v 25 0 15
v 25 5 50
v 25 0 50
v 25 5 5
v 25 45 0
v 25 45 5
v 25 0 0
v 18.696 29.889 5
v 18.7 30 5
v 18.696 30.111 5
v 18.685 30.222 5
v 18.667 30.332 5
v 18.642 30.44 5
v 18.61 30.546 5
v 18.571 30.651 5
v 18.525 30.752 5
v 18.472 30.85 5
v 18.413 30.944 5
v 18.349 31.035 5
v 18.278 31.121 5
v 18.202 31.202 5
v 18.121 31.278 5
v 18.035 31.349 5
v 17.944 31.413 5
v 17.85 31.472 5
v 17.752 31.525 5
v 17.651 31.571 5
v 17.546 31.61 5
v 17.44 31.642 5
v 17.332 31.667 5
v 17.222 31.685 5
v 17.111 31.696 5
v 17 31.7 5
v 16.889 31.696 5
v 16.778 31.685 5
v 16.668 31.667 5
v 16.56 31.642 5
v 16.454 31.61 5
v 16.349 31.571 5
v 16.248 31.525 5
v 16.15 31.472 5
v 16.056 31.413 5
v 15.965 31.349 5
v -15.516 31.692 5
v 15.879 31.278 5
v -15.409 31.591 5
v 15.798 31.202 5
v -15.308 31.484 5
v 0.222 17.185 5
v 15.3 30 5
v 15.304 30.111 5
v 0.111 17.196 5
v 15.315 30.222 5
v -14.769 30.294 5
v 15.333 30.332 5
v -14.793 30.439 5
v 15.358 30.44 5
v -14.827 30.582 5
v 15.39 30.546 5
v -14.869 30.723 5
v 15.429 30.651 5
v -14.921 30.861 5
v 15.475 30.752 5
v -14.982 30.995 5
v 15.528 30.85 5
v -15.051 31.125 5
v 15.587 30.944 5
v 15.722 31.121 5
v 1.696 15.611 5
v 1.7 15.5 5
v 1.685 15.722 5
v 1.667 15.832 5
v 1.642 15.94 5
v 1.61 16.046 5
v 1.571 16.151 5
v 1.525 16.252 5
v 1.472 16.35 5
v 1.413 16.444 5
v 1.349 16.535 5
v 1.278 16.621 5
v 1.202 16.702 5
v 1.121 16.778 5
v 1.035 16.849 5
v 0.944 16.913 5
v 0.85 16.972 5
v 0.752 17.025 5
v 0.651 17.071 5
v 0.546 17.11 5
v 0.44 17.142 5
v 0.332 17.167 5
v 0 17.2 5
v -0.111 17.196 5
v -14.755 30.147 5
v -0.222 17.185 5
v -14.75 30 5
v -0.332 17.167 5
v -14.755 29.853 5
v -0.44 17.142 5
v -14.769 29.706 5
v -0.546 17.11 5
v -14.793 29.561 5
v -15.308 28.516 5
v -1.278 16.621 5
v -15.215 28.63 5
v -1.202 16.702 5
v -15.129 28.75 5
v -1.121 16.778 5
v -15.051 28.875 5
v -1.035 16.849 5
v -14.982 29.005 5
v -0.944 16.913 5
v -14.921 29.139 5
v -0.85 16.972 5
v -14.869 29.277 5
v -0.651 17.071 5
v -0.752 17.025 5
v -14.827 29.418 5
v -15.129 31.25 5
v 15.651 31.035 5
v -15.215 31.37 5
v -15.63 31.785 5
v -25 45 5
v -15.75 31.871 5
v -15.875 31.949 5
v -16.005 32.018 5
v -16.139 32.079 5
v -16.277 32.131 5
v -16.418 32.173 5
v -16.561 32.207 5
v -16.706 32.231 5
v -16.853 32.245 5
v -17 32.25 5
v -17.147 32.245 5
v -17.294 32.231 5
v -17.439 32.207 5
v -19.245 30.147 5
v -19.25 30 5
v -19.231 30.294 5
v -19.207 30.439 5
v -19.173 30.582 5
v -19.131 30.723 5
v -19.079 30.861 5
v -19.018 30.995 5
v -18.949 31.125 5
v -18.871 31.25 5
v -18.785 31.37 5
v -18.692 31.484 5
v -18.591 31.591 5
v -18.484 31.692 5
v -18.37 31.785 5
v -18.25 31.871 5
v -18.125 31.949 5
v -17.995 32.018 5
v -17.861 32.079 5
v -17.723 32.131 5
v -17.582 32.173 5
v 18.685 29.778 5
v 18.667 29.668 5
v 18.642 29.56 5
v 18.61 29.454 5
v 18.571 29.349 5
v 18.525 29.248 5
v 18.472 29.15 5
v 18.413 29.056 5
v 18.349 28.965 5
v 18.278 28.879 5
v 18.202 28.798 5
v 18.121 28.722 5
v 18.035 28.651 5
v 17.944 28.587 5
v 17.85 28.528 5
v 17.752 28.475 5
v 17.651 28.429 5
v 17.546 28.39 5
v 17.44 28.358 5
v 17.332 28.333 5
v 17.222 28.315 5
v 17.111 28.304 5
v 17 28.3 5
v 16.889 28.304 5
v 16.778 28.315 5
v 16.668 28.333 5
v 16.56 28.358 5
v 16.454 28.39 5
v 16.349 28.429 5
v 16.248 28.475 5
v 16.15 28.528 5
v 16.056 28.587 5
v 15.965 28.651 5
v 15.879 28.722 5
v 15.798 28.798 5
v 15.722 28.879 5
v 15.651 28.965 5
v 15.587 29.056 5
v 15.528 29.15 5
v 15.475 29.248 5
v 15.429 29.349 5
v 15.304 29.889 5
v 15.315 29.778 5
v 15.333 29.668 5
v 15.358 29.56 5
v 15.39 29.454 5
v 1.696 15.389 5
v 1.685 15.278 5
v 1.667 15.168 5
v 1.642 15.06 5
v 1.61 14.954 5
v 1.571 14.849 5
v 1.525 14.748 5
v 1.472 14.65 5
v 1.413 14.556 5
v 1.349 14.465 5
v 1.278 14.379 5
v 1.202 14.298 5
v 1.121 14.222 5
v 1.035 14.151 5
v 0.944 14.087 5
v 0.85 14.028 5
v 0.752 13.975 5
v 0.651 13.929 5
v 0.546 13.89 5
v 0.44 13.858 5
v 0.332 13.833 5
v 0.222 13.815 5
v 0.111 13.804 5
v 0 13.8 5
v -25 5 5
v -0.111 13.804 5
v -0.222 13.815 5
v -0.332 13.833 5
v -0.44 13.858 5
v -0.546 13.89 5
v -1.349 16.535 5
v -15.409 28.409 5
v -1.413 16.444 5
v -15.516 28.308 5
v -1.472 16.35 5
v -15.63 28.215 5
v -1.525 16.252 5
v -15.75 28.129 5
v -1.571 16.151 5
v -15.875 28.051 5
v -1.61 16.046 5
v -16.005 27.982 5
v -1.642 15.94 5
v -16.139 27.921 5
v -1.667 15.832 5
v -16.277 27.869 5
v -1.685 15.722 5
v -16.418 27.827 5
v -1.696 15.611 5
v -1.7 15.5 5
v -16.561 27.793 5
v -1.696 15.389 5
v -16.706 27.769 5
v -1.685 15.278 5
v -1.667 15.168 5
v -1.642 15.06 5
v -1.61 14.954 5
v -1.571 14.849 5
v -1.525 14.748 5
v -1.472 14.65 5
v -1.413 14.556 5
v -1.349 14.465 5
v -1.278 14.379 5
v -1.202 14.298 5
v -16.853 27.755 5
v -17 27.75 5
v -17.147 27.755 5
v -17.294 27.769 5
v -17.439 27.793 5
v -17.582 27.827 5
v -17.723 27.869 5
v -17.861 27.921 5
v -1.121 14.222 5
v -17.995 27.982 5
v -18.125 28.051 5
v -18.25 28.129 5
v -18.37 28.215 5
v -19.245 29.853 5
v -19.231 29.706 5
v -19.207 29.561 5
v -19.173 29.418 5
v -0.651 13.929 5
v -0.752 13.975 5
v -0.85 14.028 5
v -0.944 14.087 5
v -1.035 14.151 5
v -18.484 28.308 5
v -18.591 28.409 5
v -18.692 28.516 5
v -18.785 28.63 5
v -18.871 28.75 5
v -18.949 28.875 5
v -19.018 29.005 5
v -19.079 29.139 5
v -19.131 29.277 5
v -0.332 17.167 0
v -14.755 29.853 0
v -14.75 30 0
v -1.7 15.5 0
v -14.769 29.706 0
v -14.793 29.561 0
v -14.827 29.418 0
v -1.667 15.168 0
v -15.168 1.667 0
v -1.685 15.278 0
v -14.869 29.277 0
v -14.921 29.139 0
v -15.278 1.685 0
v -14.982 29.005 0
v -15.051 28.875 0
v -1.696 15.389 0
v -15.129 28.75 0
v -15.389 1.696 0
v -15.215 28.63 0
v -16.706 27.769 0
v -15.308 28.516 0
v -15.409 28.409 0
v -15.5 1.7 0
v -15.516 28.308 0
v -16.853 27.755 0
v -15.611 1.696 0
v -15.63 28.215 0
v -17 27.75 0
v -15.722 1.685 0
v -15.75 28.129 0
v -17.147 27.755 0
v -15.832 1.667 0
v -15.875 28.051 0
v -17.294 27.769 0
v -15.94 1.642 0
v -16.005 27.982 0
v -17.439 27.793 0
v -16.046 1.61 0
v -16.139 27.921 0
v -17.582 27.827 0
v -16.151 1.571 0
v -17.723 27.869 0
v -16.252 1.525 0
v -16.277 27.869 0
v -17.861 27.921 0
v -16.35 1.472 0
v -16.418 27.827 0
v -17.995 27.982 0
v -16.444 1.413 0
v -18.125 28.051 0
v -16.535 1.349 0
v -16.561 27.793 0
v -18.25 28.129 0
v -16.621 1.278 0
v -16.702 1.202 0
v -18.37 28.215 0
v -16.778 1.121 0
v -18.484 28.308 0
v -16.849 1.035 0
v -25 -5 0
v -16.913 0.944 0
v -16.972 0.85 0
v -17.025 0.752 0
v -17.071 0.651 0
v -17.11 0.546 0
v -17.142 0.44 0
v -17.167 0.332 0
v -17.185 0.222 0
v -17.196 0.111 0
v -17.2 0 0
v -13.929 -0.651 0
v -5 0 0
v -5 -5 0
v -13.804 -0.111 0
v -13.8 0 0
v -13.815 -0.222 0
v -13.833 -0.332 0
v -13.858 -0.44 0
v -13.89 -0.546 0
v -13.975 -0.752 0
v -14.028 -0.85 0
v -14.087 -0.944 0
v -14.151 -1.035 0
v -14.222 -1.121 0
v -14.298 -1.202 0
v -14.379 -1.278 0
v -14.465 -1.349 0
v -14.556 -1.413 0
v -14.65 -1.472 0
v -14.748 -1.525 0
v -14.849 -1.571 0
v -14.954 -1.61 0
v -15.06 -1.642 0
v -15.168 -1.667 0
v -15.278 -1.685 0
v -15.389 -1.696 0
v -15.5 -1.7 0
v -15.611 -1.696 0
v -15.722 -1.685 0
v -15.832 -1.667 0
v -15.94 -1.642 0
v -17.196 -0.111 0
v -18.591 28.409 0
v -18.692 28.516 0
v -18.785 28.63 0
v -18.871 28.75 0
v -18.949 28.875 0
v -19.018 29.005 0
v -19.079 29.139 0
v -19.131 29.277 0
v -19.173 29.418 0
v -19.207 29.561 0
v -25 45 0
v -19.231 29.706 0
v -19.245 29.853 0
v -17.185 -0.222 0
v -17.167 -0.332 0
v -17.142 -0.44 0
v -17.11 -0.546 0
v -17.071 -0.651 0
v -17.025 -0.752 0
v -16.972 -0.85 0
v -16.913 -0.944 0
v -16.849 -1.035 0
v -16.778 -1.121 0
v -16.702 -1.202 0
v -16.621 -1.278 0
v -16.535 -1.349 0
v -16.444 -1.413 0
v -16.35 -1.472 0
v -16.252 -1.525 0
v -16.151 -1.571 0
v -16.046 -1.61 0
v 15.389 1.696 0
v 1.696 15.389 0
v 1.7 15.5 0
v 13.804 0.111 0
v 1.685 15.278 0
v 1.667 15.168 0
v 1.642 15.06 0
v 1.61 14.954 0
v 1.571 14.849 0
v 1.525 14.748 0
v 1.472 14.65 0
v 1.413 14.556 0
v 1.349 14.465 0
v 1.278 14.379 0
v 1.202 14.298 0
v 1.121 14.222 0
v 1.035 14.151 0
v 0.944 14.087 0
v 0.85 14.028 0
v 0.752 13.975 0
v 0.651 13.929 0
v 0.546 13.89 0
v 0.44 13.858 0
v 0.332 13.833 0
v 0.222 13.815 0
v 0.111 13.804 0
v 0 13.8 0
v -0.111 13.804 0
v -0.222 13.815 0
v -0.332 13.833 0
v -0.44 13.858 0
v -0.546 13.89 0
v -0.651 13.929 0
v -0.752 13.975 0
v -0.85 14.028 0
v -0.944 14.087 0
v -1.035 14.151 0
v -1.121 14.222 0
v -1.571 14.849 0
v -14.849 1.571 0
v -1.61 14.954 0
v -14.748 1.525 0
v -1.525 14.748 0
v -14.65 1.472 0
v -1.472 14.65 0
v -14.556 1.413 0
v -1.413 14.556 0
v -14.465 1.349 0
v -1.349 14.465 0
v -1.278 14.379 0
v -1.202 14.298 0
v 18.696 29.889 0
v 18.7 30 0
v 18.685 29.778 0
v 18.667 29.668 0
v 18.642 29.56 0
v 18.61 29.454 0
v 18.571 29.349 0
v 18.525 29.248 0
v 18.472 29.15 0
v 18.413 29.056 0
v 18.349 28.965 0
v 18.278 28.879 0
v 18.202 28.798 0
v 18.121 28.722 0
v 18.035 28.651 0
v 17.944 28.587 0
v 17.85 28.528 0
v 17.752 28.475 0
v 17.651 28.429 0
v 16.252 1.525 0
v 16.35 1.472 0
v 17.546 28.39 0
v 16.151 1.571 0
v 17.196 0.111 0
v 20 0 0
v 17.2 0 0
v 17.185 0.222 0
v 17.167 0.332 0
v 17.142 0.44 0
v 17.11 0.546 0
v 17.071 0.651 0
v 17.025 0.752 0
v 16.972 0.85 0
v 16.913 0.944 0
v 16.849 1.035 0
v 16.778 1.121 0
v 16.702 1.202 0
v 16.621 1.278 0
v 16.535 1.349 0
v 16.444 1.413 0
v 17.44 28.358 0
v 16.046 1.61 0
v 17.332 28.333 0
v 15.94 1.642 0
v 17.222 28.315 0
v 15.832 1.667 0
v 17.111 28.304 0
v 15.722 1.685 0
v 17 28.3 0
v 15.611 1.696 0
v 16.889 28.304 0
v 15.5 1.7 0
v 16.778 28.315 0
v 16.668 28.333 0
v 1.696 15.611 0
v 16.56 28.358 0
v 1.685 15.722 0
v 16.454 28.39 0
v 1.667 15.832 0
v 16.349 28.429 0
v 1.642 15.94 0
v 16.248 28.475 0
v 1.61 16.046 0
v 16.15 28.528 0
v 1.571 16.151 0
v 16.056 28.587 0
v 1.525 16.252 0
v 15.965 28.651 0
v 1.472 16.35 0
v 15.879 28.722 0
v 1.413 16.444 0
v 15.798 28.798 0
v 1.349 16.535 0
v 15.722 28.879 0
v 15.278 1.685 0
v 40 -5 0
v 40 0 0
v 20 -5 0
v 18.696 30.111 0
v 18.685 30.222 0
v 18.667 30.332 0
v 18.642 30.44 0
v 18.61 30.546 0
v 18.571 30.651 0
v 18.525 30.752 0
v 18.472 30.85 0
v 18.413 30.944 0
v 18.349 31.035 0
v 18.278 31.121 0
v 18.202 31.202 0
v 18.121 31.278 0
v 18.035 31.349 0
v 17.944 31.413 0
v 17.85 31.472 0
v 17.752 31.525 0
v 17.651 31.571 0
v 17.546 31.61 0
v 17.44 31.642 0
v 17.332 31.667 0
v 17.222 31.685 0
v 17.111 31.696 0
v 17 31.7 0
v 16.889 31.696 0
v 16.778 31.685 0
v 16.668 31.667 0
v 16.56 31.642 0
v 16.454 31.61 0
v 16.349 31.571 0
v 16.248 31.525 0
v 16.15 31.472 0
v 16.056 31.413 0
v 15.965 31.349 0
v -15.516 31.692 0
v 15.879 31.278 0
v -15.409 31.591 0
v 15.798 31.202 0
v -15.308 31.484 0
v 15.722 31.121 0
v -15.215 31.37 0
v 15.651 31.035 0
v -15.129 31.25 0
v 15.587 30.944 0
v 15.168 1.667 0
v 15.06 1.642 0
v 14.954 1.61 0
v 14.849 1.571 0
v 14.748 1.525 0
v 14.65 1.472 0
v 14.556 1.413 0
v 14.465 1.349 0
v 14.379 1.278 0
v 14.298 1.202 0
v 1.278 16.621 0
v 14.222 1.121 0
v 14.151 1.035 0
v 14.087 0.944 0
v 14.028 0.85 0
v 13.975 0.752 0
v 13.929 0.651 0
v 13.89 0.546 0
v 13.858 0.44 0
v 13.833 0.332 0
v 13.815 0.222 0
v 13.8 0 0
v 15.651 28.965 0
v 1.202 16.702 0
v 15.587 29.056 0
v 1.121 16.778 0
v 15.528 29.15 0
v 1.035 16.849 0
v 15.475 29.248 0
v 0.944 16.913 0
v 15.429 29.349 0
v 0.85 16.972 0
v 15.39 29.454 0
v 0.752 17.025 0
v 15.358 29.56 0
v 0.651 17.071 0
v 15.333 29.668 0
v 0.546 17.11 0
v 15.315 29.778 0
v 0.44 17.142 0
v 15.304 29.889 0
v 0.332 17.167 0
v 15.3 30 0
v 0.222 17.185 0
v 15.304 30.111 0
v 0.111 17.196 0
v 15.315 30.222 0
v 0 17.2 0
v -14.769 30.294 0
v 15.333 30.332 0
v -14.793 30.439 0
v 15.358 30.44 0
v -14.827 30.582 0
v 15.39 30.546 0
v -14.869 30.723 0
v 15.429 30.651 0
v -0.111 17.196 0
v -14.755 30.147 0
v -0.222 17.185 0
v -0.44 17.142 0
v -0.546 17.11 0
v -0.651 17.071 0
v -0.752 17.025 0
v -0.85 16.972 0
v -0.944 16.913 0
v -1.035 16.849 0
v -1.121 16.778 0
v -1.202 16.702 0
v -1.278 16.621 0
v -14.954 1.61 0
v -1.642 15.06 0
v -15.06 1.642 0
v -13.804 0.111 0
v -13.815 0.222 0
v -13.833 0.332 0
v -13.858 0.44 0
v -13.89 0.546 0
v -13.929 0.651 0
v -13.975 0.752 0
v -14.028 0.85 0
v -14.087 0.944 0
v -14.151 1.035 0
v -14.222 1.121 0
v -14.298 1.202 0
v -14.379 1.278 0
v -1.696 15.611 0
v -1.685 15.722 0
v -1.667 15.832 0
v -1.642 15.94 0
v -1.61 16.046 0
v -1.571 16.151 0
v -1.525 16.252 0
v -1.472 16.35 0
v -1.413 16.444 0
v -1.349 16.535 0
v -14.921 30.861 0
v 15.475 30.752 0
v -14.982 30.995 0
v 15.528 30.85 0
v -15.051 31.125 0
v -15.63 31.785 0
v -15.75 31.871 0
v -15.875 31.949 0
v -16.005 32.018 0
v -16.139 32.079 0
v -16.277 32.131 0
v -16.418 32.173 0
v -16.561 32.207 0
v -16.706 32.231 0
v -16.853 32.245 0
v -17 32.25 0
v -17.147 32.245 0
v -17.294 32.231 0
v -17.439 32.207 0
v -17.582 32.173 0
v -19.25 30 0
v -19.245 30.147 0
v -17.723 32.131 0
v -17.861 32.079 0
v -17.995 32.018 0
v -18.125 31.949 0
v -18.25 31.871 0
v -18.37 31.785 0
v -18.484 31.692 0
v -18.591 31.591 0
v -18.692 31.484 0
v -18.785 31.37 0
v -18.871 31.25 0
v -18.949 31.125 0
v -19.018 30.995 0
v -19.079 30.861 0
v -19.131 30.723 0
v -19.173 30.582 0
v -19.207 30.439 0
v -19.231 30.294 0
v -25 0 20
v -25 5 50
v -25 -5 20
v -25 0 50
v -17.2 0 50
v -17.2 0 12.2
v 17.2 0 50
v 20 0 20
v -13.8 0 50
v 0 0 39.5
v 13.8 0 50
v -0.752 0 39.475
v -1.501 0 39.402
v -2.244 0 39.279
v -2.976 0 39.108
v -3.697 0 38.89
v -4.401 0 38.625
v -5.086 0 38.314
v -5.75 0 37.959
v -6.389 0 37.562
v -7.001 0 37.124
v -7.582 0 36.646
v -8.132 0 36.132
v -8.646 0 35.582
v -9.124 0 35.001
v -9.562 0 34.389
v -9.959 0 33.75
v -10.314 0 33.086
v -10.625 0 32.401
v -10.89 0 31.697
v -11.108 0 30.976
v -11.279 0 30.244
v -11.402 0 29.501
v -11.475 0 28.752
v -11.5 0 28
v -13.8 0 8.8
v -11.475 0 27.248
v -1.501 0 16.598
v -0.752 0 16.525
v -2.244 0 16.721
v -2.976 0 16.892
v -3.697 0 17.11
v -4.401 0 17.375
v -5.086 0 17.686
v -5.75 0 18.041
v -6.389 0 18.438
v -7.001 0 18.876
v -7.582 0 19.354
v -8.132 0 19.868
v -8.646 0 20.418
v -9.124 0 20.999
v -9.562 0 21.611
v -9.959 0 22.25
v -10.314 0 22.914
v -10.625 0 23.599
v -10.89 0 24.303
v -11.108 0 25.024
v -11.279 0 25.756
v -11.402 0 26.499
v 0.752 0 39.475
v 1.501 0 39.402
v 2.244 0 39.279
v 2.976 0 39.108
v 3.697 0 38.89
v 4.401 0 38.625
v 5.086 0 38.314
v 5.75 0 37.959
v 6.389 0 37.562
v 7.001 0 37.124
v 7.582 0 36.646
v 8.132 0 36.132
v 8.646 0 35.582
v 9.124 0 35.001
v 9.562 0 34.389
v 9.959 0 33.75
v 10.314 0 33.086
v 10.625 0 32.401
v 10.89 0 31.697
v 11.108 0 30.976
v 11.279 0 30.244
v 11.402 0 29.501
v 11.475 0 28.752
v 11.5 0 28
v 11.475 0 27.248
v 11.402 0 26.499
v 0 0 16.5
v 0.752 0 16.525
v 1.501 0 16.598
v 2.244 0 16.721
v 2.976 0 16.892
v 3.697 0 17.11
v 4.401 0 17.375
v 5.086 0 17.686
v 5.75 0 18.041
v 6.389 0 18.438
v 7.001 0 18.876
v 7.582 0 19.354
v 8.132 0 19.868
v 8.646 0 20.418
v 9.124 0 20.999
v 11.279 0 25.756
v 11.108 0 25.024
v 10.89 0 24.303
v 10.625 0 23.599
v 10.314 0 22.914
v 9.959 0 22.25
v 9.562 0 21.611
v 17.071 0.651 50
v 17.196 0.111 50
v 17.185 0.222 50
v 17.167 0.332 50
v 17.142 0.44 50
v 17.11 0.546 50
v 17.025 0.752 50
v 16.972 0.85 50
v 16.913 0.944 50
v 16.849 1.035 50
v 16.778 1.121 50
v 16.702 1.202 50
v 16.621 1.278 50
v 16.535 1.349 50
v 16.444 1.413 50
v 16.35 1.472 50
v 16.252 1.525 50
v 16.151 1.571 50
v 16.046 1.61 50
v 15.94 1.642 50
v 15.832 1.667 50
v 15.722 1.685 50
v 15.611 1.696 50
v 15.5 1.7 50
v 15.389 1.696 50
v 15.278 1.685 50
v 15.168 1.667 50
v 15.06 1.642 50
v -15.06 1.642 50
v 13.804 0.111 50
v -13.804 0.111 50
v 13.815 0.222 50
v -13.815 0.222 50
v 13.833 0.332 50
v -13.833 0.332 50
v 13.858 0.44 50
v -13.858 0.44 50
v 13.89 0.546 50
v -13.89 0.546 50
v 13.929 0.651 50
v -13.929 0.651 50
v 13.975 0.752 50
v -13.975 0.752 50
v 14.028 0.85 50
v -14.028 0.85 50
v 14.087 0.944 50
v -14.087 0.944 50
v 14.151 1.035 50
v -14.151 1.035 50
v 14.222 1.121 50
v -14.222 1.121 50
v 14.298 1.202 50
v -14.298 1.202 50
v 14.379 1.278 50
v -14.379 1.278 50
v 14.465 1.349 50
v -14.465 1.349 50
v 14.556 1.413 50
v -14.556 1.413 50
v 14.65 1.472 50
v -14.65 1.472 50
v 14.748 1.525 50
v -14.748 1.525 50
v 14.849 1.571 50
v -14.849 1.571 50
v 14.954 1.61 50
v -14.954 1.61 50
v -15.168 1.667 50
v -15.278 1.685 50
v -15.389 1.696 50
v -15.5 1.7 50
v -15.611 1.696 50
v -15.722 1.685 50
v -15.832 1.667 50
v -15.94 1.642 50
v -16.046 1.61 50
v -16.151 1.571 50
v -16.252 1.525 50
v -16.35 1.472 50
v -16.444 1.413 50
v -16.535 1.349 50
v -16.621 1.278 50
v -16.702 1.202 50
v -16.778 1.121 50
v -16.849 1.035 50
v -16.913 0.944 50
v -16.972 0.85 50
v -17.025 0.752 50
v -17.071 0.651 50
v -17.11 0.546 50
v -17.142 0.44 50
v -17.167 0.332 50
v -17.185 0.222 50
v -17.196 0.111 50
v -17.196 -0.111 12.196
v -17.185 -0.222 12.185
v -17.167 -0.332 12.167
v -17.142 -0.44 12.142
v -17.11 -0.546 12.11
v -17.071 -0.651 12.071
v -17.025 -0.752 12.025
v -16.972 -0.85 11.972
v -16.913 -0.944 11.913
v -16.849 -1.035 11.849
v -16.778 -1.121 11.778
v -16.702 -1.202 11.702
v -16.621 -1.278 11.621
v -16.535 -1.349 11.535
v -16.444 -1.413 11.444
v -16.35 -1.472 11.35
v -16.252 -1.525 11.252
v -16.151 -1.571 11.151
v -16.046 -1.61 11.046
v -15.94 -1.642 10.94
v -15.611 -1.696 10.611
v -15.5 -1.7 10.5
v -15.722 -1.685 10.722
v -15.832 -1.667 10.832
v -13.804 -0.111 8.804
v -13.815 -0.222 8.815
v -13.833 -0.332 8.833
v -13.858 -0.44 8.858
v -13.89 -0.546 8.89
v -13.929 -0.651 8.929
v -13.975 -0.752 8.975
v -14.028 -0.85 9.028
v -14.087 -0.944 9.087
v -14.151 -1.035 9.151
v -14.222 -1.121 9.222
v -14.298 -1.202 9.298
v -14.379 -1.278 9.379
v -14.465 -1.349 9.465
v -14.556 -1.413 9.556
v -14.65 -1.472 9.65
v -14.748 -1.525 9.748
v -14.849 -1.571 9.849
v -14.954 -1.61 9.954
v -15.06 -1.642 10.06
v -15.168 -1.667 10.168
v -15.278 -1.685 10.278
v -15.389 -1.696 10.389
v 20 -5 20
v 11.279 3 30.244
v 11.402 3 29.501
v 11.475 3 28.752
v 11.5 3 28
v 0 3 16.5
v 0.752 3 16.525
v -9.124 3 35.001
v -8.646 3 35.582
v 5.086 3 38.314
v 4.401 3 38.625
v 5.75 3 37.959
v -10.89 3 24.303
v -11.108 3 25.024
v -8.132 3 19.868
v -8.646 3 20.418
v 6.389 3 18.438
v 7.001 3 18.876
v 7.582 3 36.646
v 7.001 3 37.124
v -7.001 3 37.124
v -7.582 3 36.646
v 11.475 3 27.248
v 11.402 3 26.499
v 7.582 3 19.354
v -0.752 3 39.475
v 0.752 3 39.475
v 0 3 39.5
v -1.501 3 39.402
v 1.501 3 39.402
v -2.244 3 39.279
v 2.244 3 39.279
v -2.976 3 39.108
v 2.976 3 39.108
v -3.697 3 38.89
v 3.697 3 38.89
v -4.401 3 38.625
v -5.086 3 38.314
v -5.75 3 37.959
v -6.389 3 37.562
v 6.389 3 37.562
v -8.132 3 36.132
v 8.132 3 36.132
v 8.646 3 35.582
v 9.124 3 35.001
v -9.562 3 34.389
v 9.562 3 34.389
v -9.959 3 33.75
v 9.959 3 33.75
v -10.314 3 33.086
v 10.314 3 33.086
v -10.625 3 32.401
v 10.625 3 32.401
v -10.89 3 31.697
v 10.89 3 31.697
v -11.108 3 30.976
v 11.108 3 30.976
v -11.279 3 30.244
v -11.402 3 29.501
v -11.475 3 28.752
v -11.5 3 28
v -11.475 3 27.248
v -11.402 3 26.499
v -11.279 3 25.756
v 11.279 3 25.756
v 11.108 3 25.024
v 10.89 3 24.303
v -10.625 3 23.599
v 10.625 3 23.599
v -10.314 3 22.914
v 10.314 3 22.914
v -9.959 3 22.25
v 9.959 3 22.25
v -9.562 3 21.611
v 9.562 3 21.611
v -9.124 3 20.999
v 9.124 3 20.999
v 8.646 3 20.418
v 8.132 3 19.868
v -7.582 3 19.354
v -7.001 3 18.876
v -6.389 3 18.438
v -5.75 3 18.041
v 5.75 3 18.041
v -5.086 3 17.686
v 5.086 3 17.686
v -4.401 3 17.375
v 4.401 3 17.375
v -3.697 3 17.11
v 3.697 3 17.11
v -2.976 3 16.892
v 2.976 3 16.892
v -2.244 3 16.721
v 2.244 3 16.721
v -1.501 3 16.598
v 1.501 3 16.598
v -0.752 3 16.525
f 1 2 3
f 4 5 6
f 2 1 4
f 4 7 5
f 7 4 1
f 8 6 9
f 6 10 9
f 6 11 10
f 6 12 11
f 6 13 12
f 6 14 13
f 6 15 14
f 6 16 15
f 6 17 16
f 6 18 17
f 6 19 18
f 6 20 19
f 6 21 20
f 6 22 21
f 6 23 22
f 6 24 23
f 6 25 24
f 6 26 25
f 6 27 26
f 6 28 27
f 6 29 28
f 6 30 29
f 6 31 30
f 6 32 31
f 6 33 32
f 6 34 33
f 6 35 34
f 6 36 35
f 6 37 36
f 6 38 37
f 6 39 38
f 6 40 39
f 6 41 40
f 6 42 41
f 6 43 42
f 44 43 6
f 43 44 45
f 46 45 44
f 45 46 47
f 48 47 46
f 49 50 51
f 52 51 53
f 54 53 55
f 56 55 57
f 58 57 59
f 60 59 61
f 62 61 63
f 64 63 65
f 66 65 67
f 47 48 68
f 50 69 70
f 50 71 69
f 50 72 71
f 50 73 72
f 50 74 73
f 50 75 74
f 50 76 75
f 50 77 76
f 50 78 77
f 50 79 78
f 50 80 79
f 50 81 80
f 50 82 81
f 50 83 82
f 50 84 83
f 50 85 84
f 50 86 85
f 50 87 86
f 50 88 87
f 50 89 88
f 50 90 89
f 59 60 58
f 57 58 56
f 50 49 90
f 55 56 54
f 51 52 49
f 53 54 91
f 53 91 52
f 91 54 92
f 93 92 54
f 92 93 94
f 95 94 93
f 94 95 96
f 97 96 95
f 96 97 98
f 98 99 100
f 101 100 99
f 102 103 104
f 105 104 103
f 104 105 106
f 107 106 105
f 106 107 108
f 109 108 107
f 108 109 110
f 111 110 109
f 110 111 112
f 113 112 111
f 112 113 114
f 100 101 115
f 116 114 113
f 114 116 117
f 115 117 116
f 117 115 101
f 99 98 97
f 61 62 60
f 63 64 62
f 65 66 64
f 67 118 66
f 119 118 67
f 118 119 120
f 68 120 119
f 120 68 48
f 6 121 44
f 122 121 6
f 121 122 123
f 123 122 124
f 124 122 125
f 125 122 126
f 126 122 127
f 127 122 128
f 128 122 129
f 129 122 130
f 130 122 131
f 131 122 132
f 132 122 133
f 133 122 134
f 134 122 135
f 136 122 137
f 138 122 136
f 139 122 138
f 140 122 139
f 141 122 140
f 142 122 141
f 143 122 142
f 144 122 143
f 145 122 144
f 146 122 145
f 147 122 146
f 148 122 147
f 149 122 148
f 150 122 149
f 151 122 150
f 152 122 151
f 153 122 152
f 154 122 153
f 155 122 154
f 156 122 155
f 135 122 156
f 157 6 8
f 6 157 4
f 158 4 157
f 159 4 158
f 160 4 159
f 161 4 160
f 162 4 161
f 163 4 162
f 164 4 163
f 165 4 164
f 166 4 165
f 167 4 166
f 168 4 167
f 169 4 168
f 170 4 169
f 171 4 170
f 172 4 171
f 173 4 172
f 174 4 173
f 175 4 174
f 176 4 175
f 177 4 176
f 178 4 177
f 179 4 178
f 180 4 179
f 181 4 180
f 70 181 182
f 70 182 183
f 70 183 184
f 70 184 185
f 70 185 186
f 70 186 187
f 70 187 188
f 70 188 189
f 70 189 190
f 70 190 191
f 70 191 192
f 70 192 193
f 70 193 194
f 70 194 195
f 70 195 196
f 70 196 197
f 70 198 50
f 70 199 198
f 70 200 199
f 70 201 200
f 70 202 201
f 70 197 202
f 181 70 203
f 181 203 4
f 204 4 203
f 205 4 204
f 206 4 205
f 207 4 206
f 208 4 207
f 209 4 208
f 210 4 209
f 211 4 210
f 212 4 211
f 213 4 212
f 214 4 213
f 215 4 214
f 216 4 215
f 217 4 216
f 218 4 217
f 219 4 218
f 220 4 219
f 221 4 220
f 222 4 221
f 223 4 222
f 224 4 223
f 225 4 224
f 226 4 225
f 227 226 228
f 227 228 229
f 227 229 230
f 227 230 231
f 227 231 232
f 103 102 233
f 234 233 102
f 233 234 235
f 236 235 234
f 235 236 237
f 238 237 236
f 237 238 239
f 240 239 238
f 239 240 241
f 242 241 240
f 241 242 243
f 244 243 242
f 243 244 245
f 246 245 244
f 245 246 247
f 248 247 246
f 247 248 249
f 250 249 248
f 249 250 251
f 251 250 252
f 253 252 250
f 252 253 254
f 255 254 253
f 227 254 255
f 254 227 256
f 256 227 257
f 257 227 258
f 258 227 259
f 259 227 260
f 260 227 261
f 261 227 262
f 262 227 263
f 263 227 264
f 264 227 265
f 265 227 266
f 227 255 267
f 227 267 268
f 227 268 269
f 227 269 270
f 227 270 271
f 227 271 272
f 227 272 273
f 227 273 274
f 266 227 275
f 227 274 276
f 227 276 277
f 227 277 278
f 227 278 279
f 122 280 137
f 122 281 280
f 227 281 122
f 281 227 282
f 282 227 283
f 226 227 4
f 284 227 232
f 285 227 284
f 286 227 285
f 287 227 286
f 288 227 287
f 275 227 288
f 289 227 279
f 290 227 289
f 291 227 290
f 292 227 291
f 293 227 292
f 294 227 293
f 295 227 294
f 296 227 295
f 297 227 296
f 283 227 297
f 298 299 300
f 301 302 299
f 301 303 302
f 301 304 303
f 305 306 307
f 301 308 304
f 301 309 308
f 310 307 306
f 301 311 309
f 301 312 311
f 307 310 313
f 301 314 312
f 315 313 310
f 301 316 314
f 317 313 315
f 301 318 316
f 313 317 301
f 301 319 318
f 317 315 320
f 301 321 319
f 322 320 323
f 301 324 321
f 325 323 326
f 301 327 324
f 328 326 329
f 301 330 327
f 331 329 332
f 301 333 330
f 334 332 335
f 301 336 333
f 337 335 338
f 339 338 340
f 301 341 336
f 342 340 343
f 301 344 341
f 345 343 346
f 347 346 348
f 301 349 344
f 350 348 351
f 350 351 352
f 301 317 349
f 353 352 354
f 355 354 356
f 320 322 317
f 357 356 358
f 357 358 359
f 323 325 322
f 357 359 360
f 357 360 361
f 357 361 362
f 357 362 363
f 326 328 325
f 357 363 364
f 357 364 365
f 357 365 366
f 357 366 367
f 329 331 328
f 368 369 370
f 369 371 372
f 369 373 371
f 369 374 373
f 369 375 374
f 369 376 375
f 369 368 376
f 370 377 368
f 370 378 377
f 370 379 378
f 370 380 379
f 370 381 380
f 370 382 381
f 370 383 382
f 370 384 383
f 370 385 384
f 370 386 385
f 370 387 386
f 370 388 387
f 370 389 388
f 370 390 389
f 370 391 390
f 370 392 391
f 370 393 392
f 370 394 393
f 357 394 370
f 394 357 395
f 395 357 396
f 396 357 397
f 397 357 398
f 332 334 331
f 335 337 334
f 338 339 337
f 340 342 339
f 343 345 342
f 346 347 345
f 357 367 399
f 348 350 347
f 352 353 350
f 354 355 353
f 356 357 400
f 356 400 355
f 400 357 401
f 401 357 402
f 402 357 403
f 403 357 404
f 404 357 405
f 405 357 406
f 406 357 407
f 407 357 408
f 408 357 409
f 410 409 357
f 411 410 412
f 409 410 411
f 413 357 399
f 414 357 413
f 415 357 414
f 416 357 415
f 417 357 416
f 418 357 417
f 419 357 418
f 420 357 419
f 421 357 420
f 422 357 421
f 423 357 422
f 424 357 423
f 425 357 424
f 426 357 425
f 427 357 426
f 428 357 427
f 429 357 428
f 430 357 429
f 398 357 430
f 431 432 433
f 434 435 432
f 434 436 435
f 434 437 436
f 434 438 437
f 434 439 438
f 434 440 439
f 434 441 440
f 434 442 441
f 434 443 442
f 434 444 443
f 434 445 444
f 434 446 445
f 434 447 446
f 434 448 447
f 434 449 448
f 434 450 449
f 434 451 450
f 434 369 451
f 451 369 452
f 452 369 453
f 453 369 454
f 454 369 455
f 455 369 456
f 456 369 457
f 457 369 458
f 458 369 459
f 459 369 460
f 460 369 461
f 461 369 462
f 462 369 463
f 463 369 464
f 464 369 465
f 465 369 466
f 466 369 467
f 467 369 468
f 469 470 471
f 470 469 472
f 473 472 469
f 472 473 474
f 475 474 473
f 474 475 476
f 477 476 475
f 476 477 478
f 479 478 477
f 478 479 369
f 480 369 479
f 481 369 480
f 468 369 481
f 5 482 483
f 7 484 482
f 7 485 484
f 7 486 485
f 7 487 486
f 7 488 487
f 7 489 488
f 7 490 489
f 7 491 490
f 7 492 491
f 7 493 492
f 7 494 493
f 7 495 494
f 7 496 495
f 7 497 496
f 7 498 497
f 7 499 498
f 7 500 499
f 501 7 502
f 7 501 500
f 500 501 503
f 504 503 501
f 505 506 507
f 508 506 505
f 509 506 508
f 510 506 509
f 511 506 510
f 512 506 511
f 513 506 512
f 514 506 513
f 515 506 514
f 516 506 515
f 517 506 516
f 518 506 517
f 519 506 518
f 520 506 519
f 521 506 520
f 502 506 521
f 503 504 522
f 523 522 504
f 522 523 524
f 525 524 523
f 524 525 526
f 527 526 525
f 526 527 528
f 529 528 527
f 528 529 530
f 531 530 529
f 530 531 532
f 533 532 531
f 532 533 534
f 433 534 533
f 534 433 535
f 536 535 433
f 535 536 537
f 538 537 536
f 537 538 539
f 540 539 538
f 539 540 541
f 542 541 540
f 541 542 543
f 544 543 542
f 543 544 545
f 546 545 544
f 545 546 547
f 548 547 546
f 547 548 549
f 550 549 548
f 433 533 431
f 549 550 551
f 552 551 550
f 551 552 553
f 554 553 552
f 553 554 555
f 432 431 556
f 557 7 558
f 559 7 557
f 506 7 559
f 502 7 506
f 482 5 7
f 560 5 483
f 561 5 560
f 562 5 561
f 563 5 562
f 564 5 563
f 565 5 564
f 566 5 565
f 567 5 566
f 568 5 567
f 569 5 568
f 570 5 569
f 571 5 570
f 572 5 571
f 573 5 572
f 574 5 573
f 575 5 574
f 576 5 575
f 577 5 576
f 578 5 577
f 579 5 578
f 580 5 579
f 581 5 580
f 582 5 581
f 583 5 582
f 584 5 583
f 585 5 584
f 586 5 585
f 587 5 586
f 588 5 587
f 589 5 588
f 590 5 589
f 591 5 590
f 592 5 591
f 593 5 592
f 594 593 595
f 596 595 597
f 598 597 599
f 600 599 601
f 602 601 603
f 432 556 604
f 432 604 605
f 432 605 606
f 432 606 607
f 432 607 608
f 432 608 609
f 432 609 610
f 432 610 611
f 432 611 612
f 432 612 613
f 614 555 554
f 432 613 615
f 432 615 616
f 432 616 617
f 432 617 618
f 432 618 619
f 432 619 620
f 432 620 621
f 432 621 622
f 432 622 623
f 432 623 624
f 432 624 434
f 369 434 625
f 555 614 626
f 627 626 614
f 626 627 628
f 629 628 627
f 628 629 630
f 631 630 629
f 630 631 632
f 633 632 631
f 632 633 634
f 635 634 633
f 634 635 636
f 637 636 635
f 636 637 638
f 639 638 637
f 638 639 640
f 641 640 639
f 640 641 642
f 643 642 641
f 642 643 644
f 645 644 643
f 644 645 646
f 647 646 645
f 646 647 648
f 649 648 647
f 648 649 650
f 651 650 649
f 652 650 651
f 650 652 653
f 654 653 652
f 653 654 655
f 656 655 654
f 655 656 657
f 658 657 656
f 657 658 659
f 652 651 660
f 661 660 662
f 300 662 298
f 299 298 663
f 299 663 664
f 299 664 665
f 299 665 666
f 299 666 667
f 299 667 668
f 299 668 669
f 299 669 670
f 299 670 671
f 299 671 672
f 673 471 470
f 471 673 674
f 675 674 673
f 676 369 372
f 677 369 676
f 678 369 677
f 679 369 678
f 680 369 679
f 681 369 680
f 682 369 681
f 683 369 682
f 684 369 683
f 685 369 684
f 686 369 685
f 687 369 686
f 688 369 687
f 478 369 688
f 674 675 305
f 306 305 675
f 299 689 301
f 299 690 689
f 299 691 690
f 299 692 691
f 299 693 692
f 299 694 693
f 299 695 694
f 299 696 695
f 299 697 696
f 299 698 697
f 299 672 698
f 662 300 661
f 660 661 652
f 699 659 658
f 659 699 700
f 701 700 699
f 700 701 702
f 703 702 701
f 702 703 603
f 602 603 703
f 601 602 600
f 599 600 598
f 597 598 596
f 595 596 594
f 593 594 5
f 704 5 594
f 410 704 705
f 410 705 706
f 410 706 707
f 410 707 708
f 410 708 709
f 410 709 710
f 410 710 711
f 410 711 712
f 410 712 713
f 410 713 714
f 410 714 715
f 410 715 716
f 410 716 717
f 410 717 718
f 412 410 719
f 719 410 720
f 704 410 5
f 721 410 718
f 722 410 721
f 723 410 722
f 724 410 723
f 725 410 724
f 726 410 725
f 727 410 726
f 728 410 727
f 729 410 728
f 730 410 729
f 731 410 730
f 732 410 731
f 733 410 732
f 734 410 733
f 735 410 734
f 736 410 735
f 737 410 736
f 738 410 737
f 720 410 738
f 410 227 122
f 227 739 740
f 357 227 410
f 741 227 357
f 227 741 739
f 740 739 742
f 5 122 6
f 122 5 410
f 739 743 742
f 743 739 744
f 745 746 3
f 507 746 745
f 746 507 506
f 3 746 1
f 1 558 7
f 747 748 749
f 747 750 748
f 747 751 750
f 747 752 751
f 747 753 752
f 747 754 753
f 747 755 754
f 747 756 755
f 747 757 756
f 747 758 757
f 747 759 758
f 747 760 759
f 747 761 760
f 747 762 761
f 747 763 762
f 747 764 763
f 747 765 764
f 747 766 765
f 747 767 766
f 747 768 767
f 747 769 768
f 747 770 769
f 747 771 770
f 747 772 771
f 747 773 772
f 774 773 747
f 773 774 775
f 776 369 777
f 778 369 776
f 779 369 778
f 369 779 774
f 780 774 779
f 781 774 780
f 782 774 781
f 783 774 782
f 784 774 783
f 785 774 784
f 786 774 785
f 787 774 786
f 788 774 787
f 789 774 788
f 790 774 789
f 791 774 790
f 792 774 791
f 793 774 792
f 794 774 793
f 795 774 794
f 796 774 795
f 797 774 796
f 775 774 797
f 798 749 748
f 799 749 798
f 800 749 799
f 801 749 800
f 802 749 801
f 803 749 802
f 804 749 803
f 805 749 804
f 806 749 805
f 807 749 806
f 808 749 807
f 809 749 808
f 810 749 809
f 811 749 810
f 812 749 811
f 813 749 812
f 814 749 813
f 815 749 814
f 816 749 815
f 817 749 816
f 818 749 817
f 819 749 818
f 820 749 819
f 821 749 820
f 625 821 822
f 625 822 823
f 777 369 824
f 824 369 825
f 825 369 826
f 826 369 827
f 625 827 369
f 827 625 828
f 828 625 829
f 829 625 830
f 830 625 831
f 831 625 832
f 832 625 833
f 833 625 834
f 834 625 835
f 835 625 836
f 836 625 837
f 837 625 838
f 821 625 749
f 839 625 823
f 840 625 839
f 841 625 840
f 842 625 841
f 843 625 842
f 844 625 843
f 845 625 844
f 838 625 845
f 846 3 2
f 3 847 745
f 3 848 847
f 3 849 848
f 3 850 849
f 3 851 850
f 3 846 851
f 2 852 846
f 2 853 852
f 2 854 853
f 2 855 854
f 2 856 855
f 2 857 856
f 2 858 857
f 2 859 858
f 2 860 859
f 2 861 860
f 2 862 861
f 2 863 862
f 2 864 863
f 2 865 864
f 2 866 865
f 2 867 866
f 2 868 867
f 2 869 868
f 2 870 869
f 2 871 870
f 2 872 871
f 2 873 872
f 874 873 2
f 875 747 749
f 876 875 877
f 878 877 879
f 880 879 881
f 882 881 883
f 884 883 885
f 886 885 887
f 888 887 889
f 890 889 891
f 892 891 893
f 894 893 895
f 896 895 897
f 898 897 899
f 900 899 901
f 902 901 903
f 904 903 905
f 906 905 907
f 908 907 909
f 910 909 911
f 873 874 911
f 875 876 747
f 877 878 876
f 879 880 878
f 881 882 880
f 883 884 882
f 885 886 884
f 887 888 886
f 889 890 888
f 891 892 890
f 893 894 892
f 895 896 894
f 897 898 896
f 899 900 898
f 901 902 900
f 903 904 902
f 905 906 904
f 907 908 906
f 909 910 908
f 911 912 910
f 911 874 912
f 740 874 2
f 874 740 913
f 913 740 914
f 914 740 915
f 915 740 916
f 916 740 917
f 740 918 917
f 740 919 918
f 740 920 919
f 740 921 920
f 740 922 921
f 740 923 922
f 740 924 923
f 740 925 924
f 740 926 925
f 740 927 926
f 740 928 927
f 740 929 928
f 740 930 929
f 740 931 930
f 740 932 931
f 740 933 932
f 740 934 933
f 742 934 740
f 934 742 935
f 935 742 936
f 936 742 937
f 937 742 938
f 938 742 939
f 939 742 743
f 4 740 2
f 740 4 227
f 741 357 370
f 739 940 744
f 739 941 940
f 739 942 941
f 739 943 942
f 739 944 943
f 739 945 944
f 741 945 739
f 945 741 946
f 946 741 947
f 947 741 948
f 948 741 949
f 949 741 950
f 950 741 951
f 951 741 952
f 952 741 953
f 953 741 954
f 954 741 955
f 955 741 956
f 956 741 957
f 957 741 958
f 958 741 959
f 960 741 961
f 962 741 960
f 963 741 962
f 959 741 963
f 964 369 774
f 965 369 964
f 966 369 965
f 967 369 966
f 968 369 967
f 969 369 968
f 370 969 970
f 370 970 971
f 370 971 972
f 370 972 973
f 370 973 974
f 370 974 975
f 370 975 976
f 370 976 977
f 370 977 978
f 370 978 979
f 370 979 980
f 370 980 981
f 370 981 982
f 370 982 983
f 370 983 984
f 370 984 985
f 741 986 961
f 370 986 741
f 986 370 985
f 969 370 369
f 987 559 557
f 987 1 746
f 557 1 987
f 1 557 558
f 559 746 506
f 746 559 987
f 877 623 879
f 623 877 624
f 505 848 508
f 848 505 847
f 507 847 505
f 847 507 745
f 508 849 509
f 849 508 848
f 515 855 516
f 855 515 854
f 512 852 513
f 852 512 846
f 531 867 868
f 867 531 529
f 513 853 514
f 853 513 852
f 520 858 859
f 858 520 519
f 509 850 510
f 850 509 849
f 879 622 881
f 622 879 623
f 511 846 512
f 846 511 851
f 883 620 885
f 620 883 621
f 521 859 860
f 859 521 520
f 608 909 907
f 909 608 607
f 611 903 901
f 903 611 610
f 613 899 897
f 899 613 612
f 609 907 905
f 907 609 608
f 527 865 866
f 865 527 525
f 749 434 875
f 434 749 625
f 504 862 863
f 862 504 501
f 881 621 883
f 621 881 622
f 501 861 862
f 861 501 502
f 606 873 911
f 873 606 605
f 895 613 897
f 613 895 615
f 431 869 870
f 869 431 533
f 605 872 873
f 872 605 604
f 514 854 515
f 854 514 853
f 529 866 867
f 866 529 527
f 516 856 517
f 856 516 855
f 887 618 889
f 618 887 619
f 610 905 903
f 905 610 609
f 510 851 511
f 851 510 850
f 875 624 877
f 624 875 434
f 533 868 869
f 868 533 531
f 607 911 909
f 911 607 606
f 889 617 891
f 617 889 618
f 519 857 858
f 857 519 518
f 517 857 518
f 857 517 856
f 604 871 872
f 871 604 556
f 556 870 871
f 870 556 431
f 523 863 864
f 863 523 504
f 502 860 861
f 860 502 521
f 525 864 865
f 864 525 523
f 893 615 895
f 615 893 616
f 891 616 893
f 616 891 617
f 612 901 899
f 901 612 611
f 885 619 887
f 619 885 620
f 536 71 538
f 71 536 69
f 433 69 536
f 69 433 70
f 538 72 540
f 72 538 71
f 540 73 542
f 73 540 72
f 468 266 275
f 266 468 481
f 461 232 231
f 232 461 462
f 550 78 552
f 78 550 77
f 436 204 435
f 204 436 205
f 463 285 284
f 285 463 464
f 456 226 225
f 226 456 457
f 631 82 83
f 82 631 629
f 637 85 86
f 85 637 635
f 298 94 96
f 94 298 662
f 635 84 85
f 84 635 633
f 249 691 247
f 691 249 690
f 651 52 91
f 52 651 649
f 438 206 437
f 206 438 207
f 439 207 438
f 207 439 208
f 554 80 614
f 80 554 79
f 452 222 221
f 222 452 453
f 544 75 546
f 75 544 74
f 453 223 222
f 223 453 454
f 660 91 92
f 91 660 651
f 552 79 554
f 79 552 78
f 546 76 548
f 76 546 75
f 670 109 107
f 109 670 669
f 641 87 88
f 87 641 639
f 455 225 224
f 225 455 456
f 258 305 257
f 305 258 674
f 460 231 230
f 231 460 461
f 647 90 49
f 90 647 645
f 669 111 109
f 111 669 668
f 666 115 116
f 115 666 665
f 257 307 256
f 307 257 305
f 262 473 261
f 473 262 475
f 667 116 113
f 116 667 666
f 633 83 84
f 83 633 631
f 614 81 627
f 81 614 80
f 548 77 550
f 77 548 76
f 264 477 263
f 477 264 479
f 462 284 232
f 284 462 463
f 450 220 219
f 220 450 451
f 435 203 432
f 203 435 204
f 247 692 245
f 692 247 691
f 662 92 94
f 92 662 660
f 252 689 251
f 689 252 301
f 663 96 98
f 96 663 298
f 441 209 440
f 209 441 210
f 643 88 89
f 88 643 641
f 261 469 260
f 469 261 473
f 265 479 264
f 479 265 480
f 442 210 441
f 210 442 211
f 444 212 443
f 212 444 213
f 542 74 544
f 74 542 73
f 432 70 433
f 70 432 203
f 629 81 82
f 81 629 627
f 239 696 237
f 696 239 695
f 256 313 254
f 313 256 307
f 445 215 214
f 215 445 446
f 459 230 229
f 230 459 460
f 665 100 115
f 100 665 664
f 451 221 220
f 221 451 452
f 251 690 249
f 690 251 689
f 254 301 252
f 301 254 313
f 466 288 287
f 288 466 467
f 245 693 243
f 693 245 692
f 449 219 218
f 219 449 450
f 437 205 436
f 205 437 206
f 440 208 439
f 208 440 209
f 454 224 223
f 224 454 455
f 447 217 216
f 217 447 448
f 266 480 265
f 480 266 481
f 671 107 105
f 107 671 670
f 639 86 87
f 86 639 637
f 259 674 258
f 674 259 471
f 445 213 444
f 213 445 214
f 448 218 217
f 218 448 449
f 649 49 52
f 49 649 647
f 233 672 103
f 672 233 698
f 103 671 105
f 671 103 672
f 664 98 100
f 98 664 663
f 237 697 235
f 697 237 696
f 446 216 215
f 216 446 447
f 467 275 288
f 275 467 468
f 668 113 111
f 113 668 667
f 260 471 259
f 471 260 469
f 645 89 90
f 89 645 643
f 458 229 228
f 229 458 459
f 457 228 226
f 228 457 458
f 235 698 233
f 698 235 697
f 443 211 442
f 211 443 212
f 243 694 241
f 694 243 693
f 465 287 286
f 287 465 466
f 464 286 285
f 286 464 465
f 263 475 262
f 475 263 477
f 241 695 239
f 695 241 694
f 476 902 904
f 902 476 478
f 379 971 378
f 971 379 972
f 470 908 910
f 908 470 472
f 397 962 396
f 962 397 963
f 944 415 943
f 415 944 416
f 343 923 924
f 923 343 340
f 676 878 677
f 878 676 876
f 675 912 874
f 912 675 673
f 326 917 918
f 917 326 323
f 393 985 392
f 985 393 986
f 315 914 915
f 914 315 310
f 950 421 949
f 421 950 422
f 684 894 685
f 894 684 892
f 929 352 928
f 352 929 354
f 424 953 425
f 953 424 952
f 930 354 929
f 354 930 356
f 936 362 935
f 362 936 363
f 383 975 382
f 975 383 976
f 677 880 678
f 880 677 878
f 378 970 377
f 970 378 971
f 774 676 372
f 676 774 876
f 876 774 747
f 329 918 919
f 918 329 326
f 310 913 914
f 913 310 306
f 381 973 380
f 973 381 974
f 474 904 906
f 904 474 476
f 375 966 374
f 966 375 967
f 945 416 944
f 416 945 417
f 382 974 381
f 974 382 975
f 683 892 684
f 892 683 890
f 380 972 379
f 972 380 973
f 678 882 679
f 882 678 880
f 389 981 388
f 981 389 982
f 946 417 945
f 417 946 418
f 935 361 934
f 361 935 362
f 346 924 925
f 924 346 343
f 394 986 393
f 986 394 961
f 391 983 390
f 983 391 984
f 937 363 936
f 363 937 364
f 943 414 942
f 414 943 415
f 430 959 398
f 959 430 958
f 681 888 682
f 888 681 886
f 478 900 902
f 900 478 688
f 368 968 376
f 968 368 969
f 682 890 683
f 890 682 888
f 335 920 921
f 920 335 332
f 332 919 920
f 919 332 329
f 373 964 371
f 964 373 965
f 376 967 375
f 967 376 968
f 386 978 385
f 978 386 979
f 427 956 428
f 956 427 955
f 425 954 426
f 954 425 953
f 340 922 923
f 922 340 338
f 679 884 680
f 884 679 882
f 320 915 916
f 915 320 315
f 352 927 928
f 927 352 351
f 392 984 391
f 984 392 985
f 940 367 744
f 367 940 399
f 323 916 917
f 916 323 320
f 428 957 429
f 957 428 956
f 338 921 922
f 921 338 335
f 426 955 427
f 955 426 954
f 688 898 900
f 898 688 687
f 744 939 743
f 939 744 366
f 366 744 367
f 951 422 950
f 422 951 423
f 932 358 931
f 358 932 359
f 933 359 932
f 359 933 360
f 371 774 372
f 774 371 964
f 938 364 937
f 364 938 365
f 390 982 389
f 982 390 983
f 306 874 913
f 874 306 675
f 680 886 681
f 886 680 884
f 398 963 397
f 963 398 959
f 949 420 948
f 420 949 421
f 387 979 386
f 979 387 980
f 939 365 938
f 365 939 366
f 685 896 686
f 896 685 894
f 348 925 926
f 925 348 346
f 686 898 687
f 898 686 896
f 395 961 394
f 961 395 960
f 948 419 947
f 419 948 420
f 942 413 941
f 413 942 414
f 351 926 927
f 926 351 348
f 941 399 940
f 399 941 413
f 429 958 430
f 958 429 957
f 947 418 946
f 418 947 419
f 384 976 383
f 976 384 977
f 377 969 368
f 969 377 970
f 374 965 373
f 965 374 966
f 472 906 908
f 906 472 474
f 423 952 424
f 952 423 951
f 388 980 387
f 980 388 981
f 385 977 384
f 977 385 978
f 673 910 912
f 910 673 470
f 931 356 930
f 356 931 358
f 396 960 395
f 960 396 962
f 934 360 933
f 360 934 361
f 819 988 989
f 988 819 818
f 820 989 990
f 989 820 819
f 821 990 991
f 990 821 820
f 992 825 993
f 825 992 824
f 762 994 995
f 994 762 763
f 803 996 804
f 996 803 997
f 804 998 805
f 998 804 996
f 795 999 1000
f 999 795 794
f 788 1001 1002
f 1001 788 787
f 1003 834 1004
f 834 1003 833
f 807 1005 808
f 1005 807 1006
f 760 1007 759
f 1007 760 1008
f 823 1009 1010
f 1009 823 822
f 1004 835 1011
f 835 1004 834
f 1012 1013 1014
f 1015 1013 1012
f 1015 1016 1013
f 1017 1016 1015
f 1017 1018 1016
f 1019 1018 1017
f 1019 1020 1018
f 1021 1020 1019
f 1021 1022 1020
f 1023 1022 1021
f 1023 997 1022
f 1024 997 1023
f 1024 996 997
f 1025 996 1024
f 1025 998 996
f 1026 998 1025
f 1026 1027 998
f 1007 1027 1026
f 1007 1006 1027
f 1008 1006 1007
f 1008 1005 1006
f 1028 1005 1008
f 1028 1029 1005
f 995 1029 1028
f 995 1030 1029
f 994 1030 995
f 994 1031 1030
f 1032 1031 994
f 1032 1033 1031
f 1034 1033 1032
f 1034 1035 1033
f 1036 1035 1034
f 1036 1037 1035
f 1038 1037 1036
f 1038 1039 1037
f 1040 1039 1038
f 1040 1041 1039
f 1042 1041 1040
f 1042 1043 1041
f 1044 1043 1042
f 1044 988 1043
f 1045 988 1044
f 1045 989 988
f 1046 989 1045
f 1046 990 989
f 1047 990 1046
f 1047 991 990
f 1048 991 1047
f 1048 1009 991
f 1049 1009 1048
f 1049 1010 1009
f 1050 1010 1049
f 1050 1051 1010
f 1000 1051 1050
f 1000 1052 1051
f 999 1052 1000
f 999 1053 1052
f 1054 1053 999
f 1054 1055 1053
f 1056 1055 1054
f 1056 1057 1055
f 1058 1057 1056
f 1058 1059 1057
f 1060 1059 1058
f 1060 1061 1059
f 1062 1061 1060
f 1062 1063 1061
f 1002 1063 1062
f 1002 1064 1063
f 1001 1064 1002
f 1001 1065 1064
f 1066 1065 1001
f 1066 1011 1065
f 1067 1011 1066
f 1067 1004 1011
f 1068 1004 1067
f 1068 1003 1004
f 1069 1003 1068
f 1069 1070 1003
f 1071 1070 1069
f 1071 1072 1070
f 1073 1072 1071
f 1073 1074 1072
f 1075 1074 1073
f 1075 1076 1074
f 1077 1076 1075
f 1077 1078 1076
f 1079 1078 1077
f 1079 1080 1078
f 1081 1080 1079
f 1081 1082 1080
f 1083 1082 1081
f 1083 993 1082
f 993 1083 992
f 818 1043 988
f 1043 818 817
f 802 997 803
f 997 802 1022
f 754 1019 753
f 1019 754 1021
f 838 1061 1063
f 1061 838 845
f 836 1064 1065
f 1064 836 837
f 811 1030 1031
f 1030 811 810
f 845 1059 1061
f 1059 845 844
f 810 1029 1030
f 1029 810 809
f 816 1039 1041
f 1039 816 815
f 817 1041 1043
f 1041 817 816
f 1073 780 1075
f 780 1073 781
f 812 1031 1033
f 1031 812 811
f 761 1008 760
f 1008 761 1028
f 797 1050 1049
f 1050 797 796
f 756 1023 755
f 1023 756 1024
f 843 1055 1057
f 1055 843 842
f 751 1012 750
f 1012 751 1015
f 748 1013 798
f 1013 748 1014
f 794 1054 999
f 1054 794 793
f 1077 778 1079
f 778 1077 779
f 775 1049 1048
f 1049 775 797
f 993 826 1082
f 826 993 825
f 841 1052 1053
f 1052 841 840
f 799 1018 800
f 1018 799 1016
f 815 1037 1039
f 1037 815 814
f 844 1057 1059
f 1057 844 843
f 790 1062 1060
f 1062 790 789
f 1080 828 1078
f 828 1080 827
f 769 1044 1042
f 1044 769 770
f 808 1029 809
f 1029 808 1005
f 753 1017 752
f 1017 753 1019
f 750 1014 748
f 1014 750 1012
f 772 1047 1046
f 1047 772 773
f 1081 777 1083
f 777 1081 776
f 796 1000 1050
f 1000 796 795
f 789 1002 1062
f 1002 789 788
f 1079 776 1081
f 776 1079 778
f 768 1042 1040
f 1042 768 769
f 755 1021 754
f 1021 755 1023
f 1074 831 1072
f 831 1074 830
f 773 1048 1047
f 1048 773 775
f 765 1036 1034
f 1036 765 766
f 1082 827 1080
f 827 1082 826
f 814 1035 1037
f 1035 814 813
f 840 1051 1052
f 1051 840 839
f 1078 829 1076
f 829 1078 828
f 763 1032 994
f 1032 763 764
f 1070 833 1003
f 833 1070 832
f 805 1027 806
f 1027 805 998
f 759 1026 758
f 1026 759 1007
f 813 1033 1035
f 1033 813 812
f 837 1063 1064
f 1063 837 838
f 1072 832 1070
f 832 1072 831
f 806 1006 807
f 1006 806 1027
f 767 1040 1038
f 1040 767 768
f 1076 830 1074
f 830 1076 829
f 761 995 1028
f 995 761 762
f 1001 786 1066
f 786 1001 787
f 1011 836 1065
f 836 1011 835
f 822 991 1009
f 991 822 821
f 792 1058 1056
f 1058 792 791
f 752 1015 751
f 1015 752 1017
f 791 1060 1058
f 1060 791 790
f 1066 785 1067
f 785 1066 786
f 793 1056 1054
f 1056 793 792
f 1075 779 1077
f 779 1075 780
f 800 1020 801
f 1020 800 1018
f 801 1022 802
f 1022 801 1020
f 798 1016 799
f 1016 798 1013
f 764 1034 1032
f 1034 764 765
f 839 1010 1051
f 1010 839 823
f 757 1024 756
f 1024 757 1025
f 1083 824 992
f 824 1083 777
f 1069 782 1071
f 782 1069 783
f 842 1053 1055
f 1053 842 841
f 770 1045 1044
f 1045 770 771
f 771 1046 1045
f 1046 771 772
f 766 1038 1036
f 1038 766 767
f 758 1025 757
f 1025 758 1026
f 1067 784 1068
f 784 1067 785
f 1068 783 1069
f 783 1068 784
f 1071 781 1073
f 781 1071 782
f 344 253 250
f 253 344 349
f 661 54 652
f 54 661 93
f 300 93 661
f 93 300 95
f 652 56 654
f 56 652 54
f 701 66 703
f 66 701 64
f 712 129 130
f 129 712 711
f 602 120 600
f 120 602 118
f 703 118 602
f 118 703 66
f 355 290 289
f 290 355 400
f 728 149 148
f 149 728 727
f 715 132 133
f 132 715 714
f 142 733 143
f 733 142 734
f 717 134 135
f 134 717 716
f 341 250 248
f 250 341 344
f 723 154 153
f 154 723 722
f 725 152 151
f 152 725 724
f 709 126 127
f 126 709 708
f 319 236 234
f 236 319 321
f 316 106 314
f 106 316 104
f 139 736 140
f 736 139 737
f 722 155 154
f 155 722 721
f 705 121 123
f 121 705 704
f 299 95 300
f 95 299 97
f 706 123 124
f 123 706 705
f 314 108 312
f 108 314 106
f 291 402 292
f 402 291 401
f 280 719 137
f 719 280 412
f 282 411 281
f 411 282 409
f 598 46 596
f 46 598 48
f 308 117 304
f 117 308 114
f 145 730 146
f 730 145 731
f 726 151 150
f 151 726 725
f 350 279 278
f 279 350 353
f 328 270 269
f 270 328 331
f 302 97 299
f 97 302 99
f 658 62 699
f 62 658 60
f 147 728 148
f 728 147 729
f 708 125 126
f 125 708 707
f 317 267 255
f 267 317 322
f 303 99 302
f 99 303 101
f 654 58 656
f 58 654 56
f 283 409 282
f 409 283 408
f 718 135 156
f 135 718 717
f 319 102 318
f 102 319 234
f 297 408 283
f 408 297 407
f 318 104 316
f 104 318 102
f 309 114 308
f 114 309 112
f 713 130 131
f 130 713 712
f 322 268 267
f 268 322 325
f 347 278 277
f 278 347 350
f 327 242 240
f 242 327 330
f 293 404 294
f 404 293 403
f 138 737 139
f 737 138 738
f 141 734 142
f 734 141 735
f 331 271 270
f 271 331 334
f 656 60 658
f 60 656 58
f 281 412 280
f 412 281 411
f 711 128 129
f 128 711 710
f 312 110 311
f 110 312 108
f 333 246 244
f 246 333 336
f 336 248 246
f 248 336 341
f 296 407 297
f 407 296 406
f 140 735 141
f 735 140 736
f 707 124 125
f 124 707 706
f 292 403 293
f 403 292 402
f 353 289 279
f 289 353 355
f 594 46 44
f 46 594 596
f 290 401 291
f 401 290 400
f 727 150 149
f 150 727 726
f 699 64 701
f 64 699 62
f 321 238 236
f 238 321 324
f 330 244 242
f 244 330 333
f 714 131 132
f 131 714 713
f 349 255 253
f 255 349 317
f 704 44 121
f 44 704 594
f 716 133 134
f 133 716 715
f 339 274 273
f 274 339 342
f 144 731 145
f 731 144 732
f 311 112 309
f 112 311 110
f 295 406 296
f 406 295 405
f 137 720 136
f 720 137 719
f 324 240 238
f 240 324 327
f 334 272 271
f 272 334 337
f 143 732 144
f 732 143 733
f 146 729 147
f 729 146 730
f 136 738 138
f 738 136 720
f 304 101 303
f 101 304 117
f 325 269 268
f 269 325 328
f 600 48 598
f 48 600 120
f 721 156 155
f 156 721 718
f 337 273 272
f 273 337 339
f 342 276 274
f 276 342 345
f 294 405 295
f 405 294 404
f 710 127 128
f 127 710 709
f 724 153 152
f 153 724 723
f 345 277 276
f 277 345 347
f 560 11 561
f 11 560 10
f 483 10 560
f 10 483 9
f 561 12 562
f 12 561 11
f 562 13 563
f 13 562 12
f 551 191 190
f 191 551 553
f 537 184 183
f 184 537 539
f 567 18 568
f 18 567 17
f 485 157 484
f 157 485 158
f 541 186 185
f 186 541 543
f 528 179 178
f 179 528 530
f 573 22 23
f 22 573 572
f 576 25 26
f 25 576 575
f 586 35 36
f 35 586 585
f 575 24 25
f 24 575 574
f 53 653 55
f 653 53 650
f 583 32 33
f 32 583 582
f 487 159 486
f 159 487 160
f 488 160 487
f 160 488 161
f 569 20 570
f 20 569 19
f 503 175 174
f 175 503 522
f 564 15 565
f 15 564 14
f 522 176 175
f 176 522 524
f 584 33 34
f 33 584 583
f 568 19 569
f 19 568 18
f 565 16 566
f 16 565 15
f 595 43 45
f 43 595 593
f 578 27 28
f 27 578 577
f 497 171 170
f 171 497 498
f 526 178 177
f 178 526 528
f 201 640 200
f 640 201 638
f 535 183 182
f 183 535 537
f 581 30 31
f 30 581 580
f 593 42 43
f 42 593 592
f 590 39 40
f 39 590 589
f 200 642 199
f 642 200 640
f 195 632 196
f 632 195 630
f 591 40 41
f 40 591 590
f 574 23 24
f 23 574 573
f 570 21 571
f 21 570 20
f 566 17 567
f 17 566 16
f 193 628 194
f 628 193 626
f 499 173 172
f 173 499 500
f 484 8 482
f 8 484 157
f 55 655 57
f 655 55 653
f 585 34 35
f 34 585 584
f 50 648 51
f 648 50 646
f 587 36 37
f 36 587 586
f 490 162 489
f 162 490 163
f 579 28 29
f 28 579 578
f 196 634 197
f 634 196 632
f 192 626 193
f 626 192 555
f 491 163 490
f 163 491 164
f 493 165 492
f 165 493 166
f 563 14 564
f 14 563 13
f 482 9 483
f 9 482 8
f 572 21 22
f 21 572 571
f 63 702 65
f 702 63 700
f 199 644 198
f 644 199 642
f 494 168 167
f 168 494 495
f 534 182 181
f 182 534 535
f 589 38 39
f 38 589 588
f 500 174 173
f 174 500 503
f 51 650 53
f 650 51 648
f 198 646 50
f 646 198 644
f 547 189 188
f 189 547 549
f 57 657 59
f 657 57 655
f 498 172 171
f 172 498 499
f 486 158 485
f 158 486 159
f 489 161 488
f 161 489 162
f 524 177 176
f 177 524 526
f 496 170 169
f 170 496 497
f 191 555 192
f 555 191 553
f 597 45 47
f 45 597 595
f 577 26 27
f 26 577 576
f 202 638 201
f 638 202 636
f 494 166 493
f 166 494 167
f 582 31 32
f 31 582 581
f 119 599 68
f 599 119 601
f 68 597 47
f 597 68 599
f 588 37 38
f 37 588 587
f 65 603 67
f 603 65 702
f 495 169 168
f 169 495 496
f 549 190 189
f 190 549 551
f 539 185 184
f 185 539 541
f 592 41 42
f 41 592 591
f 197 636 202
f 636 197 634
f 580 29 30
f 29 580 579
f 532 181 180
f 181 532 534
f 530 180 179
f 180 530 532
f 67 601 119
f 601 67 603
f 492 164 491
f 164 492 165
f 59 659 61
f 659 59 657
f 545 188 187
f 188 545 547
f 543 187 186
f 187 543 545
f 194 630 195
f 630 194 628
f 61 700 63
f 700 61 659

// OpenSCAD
// L-shaped mounting bracket for NEMA 17 stepper motor
// Print orientation: base plate flat on the bed (z = 0), motor plate building up in +Z

// ---------------- Parameters ----------------
// Base plate
base_x_min   = -25;   // base plate X extent (lower end)
base_x_max   = 25;    // base plate X extent (upper end)
base_y_min   = 0;     // base plate Y extent (front)
base_y_max   = 45;    // base plate Y extent (back)
base_z       = 5;     // base plate thickness

// Motor plate
motor_x_min  = -25;   // motor plate X extent (lower end)
motor_x_max  = 25;    // motor plate X extent (upper end)
motor_y_min  = 0;     // motor plate Y extent (front)
motor_y_max  = 5;     // motor plate Y extent (back)
motor_z      = 50;    // motor plate height

// Mounting holes
hole_m4_x    = -17;   // M4 through-hole X position (left side)
hole_m4_y    = 30;    // M4 through-hole Y position
hole_m4_d    = 4.5;   // M4 through-hole diameter
hole_m3_x    = 17;    // M3 through-hole X position (right side)
hole_m3_y    = 30;    // M3 through-hole Y position
hole_m3_d    = 3.4;   // M3 through-hole diameter

// Boss hole for motor centring
boss_d       = 23;    // boss hole diameter (along Y)
boss_x       = 0;     // boss hole centre X
boss_z       = 28;    // boss hole centre Z

// Screw holes for boss
screw_pat    = 31;    // square pattern size for M3 screws
screw_count  = 4;     // number of screw holes

// Gussets
gusset_t     = 5;     // gusset thickness (X)
gusset_y     = 20;    // gusset leg length along +Y
gusset_z     = 20;    // gusset leg length along +Z

// Misc
eps          = 0.5;   // cutter overshoot past faces
$fn          = 96;    // curve resolution

// ---------------- Model ----------------
difference() {
    union() {
        // Base plate
        translate([base_x_min, base_y_min, 0])
            cube([base_x_max - base_x_min, base_y_max - base_y_min, base_z]);

        // Vertical motor plate, standing on the back edge of the base
        translate([motor_x_min, motor_y_min, 0])
            cube([motor_x_max - motor_x_min, motor_y_max - motor_y_min, motor_z]);

        // Left gusset: right triangle in YZ, flush with left edge (x = -25)
        translate([base_x_min, 0, 0])
            rotate([90, 0, 0])
                linear_extrude(height = gusset_t)
                    polygon(points = [
                        [0, 0],
                        [gusset_y, 0],
                        [0, gusset_z]
                    ]);

        // Right gusset: right triangle in YZ, flush with right edge (x = 25)
        translate([base_x_max - gusset_t, 0, 0])
            rotate([90, 0, 0])
                linear_extrude(height = gusset_t)
                    polygon(points = [
                        [0, 0],
                        [gusset_y, 0],
                        [0, gusset_z]
                    ]);
    }

    // Through-cut for motor centring boss (along Y)
    translate([boss_x, 0, boss_z])
        rotate([90, 0, 0])
            cylinder(d = boss_d, h = motor_y_max - motor_y_min + 2 * eps, center = true);

    // M4 vertical through-hole on the left
    translate([hole_m4_x, hole_m4_y, -eps])
        cylinder(d = hole_m4_d, h = base_z + 2 * eps);

    // M3 vertical through-hole on the right
    translate([hole_m3_x, hole_m3_y, -eps])
        cylinder(d = hole_m3_d, h = base_z + 2 * eps);

    // Four M3 screw holes on a 31 mm square pattern, centred on the boss
    for (i = [0 : 3]) {
        a = [0, 90, 180, 270][i];
        translate([screw_pat / 2 * cos(a), screw_pat / 2 * sin(a), -eps])
            cylinder(d = hole_m3_d, h = motor_z + 2 * eps);
    }
}
